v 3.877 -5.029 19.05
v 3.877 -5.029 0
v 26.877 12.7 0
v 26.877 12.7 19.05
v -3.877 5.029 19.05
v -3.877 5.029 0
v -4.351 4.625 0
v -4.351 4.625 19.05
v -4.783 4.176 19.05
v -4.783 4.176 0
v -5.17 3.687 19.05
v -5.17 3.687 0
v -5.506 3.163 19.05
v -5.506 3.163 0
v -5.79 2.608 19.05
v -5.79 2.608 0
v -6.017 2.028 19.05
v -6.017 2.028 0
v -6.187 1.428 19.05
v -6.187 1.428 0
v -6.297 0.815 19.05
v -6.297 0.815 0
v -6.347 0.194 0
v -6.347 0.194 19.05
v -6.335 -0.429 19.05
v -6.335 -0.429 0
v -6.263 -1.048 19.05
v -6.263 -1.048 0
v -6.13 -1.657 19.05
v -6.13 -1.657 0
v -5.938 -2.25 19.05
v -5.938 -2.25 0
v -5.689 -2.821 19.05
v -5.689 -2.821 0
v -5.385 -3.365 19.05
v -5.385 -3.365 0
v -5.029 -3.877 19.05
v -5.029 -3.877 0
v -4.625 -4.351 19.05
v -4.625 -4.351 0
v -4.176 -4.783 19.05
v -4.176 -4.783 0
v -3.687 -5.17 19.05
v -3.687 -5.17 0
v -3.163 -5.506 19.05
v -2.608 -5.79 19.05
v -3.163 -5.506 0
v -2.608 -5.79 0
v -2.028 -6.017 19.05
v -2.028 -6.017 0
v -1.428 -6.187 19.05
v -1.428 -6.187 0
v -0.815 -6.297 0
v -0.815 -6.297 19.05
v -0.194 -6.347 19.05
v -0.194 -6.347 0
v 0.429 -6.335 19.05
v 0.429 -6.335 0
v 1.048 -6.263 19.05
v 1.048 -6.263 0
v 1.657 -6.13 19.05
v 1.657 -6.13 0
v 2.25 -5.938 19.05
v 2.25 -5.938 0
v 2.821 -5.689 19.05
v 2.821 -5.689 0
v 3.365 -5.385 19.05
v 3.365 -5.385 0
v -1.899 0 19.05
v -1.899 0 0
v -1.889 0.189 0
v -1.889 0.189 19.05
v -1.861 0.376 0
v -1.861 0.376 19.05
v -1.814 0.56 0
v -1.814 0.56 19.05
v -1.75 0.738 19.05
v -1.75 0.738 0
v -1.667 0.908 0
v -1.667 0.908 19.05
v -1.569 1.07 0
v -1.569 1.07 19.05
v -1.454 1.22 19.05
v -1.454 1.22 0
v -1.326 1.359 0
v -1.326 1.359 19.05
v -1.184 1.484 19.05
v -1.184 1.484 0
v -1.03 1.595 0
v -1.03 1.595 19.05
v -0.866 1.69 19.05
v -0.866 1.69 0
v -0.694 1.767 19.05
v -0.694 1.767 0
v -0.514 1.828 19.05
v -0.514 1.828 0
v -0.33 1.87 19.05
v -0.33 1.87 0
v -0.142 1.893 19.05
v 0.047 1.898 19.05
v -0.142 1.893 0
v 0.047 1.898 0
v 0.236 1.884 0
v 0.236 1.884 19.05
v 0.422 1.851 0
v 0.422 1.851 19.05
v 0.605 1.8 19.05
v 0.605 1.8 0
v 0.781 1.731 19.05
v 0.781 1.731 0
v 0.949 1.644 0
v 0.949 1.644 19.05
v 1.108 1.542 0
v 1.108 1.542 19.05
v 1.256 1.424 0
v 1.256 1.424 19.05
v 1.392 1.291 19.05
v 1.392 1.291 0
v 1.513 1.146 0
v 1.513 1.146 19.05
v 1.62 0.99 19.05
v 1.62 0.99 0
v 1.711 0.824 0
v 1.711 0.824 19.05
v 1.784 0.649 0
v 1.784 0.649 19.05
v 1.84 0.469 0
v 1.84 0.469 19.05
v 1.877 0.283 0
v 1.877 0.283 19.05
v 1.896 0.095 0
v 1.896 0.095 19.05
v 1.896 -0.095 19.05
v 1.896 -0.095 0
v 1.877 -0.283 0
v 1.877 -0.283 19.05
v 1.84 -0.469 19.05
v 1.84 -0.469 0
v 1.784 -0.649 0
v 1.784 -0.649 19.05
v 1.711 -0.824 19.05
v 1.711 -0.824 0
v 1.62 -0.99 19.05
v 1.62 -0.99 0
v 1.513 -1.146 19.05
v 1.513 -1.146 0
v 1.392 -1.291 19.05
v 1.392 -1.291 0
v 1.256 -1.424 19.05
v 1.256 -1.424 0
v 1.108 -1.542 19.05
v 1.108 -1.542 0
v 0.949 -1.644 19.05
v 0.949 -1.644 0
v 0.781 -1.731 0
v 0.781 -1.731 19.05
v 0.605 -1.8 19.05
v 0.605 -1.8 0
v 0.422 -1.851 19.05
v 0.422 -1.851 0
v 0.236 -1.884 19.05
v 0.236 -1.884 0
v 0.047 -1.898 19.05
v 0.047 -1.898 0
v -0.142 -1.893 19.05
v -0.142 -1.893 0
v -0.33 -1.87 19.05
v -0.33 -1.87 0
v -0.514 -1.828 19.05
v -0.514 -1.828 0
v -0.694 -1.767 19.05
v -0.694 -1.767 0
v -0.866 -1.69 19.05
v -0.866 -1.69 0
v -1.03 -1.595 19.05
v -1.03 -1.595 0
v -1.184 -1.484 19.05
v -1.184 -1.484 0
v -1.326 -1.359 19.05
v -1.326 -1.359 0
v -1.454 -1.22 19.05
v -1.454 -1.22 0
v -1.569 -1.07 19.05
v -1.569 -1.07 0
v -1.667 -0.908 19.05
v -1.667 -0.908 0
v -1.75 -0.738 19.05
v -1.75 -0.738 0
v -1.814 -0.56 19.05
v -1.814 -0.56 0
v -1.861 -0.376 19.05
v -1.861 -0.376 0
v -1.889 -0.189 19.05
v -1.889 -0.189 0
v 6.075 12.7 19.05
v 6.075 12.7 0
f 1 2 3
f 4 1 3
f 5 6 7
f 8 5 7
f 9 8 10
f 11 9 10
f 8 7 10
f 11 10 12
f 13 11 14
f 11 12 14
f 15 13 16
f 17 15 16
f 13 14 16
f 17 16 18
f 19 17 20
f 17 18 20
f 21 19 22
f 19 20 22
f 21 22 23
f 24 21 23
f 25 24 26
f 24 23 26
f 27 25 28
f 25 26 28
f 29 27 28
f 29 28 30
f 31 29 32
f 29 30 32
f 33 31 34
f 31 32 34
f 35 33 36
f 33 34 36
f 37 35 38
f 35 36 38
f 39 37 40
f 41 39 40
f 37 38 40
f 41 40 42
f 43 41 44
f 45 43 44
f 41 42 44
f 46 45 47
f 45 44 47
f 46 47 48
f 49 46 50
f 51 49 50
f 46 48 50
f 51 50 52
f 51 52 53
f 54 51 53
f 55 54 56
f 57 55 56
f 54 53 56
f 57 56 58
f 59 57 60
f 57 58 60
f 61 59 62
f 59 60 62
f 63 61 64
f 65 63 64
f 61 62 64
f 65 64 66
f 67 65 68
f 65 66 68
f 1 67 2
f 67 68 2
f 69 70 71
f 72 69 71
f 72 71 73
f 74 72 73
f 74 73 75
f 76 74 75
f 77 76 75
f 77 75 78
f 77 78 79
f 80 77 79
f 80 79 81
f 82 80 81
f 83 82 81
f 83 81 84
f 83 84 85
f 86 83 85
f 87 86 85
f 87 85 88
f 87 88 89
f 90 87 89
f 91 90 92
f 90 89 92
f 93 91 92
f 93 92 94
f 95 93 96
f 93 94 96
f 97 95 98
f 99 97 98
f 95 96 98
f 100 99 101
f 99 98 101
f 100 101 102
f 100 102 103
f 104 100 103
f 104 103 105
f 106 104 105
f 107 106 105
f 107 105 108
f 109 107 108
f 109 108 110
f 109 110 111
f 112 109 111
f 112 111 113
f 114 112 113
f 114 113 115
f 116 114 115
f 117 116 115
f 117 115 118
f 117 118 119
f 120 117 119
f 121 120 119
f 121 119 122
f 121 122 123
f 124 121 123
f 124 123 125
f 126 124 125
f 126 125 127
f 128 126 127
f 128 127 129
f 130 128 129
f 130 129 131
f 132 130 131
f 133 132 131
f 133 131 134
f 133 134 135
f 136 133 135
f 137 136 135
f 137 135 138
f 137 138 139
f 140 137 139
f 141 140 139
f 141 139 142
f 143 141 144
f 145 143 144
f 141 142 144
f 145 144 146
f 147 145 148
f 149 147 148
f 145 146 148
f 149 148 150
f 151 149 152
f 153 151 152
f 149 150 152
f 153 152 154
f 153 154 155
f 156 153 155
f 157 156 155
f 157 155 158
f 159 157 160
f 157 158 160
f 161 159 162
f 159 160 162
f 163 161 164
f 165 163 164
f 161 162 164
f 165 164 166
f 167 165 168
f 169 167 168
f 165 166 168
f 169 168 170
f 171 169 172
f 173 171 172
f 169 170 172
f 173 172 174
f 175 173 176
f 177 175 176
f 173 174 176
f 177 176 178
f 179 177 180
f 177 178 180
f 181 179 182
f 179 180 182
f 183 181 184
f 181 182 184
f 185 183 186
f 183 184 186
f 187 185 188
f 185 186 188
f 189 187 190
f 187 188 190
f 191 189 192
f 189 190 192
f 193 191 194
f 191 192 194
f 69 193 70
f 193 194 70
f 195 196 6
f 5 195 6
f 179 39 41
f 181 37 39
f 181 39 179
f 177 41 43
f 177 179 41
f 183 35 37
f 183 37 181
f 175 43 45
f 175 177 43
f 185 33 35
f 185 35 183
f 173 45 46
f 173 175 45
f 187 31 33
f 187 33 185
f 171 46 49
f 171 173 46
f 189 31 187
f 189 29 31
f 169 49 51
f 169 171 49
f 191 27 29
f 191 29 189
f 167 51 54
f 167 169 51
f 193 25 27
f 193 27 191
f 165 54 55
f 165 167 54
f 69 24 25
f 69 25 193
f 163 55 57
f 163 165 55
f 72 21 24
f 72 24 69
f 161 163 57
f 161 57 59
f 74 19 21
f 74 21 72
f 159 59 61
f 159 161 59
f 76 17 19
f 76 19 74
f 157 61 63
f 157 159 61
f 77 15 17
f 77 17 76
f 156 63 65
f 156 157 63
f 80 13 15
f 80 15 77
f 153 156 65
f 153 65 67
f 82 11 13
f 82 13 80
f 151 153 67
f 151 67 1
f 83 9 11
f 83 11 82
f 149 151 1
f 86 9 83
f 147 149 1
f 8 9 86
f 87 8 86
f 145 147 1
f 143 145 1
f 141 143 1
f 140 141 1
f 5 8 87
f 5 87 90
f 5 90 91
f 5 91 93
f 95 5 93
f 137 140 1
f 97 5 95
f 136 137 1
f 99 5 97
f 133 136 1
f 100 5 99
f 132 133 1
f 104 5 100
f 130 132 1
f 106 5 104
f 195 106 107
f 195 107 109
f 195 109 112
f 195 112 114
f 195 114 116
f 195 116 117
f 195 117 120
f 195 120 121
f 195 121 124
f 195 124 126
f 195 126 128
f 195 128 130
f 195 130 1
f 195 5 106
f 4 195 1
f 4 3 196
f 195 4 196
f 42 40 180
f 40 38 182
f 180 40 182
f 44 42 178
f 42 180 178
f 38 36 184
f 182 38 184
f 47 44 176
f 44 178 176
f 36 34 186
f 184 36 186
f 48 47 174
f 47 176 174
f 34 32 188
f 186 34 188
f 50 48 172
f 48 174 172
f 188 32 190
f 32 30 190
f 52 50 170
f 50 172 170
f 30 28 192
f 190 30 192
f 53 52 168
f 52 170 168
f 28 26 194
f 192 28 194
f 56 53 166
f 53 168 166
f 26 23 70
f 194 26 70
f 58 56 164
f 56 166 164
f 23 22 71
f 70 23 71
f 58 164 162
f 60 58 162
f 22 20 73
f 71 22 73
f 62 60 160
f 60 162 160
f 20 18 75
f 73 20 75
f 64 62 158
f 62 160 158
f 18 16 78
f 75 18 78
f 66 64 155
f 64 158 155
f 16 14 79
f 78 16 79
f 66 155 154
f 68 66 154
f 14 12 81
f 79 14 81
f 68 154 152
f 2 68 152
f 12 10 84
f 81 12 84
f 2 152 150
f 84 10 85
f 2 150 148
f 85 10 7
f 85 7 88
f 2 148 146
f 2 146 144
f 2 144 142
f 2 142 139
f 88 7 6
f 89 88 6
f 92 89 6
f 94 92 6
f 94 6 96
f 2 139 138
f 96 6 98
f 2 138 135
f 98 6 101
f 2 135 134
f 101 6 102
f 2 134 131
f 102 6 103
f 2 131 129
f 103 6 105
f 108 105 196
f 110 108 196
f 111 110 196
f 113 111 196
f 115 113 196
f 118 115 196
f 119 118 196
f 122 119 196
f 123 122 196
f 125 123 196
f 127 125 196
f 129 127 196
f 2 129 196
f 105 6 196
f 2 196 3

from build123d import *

# Parameters (mm, degrees)
BOSS_EXTRUDE1_DEPTH   = 19.05
F_6_CLEARANCE_HOLE1_D = 3.7973


with BuildPart() as part:
    # Sketch1 → Boss-Extrude1 (new body)
    with BuildSketch(Plane.XY):
        with BuildLine():
            Line((6.074664, 12.7), (-3.876684639, 5.029295797))
            ThreePointArc((-3.876684639, 5.029295797), (-5.029295797, -3.876684639), (3.876684639, -5.029295797))
            Line((3.876684639, -5.029295797), (26.877233079, 12.7))
            Line((26.877233079, 12.7), (6.074664, 12.7))
        make_face()
    extrude(amount=BOSS_EXTRUDE1_DEPTH)

    # #6 Clearance Hole1 (through all)
    with Locations(Plane.XY.offset(19.05)):
        with Locations((0, 0)):
            Hole(F_6_CLEARANCE_HOLE1_D / 2)


solid = part.part
